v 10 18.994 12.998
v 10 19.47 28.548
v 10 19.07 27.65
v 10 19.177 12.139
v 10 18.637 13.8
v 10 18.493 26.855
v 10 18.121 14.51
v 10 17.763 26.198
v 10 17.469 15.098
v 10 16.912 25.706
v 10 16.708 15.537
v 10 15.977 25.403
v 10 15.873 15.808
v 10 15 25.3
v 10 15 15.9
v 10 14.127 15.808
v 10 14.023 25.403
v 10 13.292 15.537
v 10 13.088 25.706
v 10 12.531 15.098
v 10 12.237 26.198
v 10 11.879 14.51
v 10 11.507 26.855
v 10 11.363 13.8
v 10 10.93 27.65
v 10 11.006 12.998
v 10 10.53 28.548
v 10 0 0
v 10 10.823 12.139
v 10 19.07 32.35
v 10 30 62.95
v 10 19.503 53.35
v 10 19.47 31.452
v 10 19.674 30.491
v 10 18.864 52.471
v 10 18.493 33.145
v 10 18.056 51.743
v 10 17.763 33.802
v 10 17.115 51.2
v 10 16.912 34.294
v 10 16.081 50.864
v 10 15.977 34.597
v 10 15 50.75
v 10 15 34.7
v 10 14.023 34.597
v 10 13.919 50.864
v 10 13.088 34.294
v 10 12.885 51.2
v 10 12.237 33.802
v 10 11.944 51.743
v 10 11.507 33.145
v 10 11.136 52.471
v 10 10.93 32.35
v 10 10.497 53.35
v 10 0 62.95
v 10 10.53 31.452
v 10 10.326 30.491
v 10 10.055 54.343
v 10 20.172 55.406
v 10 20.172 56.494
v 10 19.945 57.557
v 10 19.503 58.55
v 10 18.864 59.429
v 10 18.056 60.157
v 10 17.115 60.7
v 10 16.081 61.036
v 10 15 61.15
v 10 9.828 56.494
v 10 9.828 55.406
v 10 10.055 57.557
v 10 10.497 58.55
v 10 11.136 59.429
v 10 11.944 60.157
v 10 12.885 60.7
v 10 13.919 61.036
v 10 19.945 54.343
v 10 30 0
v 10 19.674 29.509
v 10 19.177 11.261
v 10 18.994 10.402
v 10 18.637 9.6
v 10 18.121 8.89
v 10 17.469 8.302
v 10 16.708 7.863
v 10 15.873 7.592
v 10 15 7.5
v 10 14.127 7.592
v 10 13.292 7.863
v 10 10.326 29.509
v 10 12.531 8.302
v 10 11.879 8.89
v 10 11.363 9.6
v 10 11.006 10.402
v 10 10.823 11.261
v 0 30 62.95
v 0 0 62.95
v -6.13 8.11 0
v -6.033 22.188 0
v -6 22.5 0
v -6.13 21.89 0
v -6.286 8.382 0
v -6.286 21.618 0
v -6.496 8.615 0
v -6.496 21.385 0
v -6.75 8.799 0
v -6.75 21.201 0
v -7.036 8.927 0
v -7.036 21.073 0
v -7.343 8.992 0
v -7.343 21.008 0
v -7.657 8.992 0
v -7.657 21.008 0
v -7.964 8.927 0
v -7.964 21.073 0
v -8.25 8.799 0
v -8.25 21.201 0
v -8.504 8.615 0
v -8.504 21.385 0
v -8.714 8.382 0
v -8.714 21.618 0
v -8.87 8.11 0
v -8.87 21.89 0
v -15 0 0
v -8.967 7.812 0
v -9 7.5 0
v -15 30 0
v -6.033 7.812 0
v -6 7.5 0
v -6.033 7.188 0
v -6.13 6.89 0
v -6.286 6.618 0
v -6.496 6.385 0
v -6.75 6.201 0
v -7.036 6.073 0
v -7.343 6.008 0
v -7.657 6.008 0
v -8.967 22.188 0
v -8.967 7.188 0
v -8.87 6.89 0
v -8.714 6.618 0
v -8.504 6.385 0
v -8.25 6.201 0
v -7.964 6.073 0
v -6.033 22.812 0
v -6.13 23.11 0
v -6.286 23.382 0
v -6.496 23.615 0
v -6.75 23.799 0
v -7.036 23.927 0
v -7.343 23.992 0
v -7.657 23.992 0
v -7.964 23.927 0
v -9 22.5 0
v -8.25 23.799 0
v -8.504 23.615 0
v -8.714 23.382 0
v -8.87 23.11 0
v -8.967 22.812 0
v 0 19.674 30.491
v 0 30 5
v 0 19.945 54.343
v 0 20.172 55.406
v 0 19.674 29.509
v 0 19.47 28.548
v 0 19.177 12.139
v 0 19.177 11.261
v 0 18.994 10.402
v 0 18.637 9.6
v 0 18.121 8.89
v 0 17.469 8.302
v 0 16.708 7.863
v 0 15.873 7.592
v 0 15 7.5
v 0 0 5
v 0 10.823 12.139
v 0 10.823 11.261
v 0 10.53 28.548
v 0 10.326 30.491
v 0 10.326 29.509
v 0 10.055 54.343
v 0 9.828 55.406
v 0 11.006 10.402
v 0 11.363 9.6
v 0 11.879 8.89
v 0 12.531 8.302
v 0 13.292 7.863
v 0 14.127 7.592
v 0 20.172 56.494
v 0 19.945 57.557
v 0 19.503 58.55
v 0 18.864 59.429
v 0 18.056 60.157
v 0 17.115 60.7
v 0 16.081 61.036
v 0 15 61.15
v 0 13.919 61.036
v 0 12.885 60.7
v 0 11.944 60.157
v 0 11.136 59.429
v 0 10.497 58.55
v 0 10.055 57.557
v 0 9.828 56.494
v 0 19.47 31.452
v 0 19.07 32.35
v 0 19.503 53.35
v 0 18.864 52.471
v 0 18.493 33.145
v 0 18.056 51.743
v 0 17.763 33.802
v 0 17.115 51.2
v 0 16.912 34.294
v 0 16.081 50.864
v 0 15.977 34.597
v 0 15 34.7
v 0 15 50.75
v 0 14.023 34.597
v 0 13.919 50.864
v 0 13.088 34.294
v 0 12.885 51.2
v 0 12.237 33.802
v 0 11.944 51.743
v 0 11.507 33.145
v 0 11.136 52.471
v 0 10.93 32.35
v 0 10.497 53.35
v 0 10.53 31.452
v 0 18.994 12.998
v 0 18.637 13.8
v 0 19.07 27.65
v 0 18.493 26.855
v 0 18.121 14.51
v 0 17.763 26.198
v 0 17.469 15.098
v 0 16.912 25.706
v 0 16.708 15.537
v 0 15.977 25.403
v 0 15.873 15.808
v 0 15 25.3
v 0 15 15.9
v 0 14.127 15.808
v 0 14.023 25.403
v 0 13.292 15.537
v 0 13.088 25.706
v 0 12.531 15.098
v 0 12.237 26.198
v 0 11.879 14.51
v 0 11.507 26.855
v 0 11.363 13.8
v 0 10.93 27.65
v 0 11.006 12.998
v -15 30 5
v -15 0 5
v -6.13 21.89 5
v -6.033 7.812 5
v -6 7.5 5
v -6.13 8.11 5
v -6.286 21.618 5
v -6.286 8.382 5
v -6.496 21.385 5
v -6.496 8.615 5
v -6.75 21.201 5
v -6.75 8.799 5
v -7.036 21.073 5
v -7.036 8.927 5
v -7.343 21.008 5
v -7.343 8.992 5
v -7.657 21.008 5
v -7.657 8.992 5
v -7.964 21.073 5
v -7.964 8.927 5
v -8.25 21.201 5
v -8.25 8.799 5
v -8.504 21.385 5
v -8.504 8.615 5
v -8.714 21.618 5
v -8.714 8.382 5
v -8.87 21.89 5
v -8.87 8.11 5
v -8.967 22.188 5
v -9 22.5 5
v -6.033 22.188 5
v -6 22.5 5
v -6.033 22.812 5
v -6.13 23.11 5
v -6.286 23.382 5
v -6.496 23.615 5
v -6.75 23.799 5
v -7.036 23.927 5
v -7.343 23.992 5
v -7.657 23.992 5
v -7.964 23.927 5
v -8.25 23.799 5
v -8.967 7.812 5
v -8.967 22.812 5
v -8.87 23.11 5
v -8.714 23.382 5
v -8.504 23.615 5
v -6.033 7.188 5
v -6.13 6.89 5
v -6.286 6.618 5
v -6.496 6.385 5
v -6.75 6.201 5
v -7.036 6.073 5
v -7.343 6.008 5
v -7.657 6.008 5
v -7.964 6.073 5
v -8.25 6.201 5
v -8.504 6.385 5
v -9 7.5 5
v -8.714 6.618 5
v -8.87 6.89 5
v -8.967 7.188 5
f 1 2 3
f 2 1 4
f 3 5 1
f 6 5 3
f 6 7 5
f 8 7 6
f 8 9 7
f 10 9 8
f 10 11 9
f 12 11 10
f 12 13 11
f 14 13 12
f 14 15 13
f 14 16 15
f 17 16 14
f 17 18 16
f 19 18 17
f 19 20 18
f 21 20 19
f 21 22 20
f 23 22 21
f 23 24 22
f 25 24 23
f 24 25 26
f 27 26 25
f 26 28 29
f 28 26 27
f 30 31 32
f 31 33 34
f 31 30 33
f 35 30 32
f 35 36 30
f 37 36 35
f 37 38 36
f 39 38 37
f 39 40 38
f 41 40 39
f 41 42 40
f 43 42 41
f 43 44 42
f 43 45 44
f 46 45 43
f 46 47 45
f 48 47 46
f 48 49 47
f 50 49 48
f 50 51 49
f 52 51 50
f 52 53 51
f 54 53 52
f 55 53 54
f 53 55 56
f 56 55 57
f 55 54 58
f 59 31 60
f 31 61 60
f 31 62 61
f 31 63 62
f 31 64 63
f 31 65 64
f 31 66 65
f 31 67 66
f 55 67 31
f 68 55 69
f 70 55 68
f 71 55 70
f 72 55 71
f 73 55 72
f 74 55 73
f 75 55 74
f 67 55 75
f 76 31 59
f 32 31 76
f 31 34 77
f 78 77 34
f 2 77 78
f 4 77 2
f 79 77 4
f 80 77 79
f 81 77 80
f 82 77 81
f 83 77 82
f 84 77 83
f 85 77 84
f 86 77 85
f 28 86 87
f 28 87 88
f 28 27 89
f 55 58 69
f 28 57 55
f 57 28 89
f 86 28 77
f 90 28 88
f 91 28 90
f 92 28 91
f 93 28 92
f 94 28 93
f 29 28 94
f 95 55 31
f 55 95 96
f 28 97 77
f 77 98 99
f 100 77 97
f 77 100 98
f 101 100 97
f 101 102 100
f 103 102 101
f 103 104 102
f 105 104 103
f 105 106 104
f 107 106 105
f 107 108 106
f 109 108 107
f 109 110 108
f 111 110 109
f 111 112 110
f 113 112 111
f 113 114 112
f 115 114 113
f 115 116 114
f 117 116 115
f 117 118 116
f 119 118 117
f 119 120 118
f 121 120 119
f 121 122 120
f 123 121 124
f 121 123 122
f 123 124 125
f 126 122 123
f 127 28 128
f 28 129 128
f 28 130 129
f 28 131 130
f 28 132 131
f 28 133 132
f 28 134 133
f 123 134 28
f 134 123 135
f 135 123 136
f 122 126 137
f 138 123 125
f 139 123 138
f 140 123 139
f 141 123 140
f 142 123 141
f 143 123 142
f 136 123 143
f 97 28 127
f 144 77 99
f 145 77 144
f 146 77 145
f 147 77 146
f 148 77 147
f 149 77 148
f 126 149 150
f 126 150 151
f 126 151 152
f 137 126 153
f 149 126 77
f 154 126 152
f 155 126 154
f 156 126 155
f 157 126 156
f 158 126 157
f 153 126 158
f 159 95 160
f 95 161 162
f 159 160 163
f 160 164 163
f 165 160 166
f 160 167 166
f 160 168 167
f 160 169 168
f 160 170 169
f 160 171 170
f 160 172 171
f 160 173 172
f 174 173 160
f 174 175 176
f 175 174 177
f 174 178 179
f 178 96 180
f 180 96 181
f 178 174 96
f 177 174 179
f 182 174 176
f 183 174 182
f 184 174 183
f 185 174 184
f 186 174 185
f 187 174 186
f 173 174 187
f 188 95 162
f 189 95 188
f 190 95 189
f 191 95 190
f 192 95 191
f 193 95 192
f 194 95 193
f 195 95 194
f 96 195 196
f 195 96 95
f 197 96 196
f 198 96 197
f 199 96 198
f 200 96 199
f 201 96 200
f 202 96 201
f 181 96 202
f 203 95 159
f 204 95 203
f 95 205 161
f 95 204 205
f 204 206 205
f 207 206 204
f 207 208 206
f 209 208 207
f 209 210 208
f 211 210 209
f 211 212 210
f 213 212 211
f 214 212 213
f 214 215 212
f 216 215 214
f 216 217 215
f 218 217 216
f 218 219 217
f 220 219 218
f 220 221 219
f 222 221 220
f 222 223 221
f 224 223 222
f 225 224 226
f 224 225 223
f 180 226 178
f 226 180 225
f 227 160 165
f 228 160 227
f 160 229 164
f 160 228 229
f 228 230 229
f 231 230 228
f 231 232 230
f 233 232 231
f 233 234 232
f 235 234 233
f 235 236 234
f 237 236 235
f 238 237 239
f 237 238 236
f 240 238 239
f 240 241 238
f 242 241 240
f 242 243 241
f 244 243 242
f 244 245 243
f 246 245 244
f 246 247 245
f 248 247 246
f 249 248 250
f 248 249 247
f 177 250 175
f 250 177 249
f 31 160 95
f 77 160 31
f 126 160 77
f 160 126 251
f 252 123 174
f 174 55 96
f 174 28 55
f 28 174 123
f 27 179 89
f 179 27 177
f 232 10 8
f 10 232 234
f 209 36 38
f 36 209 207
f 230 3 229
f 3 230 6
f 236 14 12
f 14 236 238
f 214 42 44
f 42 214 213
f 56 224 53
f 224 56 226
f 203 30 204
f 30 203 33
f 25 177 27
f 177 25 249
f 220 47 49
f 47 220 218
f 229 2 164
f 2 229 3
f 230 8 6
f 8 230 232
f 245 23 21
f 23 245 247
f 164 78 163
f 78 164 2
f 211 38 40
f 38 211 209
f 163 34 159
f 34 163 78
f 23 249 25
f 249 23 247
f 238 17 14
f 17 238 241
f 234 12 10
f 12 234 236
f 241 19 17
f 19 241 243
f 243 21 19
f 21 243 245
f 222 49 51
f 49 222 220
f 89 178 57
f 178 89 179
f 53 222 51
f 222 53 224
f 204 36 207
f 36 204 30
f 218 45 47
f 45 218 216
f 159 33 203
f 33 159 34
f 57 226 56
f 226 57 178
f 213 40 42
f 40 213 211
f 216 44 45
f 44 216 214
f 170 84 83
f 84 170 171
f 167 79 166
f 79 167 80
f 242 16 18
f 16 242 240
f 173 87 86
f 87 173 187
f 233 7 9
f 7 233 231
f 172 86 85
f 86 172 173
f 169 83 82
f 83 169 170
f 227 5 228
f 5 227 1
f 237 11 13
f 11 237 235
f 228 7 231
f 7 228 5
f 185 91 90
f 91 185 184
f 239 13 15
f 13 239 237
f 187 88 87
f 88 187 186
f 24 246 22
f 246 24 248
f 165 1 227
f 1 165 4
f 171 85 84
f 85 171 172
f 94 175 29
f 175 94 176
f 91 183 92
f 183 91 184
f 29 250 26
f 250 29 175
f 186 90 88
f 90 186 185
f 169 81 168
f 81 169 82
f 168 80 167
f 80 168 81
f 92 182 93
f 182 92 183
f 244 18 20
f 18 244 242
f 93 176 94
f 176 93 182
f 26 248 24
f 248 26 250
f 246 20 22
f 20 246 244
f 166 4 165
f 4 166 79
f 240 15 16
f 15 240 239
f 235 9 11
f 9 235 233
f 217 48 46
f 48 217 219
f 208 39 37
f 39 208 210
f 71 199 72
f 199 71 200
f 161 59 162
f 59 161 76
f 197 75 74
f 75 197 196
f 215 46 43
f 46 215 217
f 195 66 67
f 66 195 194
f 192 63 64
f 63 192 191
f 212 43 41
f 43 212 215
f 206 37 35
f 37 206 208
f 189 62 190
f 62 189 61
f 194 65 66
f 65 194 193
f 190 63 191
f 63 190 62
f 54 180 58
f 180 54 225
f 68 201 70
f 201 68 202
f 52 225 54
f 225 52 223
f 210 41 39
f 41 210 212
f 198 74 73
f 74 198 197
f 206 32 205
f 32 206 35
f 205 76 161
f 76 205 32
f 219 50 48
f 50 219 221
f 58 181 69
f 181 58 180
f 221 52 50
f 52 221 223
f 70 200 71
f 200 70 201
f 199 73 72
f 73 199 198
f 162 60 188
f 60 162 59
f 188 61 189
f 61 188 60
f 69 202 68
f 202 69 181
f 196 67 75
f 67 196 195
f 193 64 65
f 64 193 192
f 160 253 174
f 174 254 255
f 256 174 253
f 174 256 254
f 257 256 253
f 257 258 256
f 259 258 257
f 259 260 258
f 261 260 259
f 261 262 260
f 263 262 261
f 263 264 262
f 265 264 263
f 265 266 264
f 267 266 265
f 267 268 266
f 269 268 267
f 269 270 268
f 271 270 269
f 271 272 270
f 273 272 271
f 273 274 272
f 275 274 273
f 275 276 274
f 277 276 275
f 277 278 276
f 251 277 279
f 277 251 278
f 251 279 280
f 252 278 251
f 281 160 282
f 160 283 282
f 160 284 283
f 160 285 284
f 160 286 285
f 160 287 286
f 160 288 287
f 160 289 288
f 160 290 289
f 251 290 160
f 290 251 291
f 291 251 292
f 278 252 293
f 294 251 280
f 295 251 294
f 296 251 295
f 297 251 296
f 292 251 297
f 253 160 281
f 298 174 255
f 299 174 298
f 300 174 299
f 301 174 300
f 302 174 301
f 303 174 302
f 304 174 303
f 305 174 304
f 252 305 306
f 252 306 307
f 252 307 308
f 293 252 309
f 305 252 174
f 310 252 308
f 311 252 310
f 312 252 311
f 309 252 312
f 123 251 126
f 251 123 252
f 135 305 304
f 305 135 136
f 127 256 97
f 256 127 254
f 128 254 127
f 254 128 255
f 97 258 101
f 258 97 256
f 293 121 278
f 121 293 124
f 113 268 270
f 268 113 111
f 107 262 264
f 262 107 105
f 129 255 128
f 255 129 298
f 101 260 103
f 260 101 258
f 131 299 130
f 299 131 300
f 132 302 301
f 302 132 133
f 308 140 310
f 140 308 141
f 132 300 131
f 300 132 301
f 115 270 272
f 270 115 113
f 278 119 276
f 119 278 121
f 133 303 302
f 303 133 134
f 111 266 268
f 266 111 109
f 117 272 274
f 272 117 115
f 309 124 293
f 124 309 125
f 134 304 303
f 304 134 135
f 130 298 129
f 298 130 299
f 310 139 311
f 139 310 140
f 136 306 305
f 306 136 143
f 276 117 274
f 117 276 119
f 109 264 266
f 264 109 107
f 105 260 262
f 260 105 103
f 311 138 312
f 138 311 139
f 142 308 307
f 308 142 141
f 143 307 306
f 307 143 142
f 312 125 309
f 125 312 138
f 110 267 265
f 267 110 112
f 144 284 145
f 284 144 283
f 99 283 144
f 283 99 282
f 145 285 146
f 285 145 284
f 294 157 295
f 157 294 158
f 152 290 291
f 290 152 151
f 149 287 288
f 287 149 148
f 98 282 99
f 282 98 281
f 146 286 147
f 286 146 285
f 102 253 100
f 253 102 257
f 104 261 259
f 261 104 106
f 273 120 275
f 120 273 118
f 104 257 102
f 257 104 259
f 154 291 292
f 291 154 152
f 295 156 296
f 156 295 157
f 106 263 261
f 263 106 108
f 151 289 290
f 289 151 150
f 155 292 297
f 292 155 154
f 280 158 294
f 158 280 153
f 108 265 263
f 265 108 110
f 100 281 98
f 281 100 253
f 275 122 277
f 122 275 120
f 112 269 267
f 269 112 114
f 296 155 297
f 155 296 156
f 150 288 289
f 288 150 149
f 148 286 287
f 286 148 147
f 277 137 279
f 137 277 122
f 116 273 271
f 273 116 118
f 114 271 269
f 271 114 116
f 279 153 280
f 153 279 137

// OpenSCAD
// file: syringePumpConstants.scad
/* === Project-universal Constants === */

//Not all of these variables are used in this specific model,
//but the same variable set is used across all models in this project.

$fs = 0.1;

inch = 25.4; //for mm conversion

//width of base

// 8020 profile is 1 inch wide
//baseSizeY = 2*inch;
//screwPlateSize = 25;	
//screwRadius = 3.5;

// OpenBeam is 15mm wide
baseSizeY = 2*15;
screwPlateSize = 15;	
screwRadius = 1.5;

centerY = baseSizeY / 2; //both axes go right down the middle of the base

//stepper motor
stepperZSize = 42;
stepperYSize = 42;

//608 bearing 
bearing608Height = 8.5;
bearing608Diameter = 22.5;

//height of holder for 80/20 screws
mountPlateHeight = 5;

//axis heights
threadedAxisHeight = stepperZSize/2 + mountPlateHeight + 4;
echo("threadedAxisHeight ", threadedAxisHeight);
smoothAxisHeight = (threadedAxisHeight-6.6) / 2;
smoothRodRadius = 4.2;

//syringe properties
//barrelDiameter = 25;
//
//barrelSlotThickness = 3;
//barrelSlotHeight = 28;

// 20ml BD plastic disposable syringe REF 302830
barrelDiameter = 21.4;
barrelSlotThickness = 3;
barrelSlotHeight = 28;

syringeCenterHeight = threadedAxisHeight + bearing608Diameter/2 + 4 + barrelDiameter/2;

//fixes render oddities
floatCorrection = 0.001; 
floatCorrection2 = 2*floatCorrection; 
// main file
include <syringePumpConstants.scad>

/* === Model-specific Constants === */

//cube containing rods and syringe barrel stop
mountXSize = 10;
mountZSize = syringeCenterHeight+7;


/* === Model === */

//main cube, holds the two axes
difference(){
	cube(size=[mountXSize,baseSizeY,mountZSize]);
	
	
	//bore hole for threaded rod
	translate([-floatCorrection,centerY,threadedAxisHeight]){
		rotate(a=[0,90,0]){
			cylinder(h=mountXSize+floatCorrection2, r=smoothRodRadius+0.5);
		}
	}

	//hole for smooth rod (needs to fit fairly tight)
	translate([-floatCorrection,centerY,smoothAxisHeight]){
		rotate(a=[0,90,0]){
			cylinder(h=mountXSize+floatCorrection2, r=smoothRodRadius);
		}
	}
	
	//hole for syringe barrel stopper
	translate([-floatCorrection,centerY,syringeCenterHeight]){
		rotate(a=[0,90,0]){
			cylinder(h=mountXSize+floatCorrection2, r=5.2);
		}
	}
}

difference(){
	translate([-screwPlateSize,0,0]){
		cube(size=[screwPlateSize,baseSizeY,mountPlateHeight]);
	}

	translate([-screwPlateSize/2,baseSizeY/4,0]){
		cylinder(h=mountPlateHeight, r=screwRadius);
	}
	translate([-screwPlateSize/2,3*baseSizeY/4,0]){
		cylinder(h=mountPlateHeight, r=screwRadius);
	}

}

module bearing608(){
	cylinder(h=bearing608Height, r=bearing608Diameter/2);	
}
